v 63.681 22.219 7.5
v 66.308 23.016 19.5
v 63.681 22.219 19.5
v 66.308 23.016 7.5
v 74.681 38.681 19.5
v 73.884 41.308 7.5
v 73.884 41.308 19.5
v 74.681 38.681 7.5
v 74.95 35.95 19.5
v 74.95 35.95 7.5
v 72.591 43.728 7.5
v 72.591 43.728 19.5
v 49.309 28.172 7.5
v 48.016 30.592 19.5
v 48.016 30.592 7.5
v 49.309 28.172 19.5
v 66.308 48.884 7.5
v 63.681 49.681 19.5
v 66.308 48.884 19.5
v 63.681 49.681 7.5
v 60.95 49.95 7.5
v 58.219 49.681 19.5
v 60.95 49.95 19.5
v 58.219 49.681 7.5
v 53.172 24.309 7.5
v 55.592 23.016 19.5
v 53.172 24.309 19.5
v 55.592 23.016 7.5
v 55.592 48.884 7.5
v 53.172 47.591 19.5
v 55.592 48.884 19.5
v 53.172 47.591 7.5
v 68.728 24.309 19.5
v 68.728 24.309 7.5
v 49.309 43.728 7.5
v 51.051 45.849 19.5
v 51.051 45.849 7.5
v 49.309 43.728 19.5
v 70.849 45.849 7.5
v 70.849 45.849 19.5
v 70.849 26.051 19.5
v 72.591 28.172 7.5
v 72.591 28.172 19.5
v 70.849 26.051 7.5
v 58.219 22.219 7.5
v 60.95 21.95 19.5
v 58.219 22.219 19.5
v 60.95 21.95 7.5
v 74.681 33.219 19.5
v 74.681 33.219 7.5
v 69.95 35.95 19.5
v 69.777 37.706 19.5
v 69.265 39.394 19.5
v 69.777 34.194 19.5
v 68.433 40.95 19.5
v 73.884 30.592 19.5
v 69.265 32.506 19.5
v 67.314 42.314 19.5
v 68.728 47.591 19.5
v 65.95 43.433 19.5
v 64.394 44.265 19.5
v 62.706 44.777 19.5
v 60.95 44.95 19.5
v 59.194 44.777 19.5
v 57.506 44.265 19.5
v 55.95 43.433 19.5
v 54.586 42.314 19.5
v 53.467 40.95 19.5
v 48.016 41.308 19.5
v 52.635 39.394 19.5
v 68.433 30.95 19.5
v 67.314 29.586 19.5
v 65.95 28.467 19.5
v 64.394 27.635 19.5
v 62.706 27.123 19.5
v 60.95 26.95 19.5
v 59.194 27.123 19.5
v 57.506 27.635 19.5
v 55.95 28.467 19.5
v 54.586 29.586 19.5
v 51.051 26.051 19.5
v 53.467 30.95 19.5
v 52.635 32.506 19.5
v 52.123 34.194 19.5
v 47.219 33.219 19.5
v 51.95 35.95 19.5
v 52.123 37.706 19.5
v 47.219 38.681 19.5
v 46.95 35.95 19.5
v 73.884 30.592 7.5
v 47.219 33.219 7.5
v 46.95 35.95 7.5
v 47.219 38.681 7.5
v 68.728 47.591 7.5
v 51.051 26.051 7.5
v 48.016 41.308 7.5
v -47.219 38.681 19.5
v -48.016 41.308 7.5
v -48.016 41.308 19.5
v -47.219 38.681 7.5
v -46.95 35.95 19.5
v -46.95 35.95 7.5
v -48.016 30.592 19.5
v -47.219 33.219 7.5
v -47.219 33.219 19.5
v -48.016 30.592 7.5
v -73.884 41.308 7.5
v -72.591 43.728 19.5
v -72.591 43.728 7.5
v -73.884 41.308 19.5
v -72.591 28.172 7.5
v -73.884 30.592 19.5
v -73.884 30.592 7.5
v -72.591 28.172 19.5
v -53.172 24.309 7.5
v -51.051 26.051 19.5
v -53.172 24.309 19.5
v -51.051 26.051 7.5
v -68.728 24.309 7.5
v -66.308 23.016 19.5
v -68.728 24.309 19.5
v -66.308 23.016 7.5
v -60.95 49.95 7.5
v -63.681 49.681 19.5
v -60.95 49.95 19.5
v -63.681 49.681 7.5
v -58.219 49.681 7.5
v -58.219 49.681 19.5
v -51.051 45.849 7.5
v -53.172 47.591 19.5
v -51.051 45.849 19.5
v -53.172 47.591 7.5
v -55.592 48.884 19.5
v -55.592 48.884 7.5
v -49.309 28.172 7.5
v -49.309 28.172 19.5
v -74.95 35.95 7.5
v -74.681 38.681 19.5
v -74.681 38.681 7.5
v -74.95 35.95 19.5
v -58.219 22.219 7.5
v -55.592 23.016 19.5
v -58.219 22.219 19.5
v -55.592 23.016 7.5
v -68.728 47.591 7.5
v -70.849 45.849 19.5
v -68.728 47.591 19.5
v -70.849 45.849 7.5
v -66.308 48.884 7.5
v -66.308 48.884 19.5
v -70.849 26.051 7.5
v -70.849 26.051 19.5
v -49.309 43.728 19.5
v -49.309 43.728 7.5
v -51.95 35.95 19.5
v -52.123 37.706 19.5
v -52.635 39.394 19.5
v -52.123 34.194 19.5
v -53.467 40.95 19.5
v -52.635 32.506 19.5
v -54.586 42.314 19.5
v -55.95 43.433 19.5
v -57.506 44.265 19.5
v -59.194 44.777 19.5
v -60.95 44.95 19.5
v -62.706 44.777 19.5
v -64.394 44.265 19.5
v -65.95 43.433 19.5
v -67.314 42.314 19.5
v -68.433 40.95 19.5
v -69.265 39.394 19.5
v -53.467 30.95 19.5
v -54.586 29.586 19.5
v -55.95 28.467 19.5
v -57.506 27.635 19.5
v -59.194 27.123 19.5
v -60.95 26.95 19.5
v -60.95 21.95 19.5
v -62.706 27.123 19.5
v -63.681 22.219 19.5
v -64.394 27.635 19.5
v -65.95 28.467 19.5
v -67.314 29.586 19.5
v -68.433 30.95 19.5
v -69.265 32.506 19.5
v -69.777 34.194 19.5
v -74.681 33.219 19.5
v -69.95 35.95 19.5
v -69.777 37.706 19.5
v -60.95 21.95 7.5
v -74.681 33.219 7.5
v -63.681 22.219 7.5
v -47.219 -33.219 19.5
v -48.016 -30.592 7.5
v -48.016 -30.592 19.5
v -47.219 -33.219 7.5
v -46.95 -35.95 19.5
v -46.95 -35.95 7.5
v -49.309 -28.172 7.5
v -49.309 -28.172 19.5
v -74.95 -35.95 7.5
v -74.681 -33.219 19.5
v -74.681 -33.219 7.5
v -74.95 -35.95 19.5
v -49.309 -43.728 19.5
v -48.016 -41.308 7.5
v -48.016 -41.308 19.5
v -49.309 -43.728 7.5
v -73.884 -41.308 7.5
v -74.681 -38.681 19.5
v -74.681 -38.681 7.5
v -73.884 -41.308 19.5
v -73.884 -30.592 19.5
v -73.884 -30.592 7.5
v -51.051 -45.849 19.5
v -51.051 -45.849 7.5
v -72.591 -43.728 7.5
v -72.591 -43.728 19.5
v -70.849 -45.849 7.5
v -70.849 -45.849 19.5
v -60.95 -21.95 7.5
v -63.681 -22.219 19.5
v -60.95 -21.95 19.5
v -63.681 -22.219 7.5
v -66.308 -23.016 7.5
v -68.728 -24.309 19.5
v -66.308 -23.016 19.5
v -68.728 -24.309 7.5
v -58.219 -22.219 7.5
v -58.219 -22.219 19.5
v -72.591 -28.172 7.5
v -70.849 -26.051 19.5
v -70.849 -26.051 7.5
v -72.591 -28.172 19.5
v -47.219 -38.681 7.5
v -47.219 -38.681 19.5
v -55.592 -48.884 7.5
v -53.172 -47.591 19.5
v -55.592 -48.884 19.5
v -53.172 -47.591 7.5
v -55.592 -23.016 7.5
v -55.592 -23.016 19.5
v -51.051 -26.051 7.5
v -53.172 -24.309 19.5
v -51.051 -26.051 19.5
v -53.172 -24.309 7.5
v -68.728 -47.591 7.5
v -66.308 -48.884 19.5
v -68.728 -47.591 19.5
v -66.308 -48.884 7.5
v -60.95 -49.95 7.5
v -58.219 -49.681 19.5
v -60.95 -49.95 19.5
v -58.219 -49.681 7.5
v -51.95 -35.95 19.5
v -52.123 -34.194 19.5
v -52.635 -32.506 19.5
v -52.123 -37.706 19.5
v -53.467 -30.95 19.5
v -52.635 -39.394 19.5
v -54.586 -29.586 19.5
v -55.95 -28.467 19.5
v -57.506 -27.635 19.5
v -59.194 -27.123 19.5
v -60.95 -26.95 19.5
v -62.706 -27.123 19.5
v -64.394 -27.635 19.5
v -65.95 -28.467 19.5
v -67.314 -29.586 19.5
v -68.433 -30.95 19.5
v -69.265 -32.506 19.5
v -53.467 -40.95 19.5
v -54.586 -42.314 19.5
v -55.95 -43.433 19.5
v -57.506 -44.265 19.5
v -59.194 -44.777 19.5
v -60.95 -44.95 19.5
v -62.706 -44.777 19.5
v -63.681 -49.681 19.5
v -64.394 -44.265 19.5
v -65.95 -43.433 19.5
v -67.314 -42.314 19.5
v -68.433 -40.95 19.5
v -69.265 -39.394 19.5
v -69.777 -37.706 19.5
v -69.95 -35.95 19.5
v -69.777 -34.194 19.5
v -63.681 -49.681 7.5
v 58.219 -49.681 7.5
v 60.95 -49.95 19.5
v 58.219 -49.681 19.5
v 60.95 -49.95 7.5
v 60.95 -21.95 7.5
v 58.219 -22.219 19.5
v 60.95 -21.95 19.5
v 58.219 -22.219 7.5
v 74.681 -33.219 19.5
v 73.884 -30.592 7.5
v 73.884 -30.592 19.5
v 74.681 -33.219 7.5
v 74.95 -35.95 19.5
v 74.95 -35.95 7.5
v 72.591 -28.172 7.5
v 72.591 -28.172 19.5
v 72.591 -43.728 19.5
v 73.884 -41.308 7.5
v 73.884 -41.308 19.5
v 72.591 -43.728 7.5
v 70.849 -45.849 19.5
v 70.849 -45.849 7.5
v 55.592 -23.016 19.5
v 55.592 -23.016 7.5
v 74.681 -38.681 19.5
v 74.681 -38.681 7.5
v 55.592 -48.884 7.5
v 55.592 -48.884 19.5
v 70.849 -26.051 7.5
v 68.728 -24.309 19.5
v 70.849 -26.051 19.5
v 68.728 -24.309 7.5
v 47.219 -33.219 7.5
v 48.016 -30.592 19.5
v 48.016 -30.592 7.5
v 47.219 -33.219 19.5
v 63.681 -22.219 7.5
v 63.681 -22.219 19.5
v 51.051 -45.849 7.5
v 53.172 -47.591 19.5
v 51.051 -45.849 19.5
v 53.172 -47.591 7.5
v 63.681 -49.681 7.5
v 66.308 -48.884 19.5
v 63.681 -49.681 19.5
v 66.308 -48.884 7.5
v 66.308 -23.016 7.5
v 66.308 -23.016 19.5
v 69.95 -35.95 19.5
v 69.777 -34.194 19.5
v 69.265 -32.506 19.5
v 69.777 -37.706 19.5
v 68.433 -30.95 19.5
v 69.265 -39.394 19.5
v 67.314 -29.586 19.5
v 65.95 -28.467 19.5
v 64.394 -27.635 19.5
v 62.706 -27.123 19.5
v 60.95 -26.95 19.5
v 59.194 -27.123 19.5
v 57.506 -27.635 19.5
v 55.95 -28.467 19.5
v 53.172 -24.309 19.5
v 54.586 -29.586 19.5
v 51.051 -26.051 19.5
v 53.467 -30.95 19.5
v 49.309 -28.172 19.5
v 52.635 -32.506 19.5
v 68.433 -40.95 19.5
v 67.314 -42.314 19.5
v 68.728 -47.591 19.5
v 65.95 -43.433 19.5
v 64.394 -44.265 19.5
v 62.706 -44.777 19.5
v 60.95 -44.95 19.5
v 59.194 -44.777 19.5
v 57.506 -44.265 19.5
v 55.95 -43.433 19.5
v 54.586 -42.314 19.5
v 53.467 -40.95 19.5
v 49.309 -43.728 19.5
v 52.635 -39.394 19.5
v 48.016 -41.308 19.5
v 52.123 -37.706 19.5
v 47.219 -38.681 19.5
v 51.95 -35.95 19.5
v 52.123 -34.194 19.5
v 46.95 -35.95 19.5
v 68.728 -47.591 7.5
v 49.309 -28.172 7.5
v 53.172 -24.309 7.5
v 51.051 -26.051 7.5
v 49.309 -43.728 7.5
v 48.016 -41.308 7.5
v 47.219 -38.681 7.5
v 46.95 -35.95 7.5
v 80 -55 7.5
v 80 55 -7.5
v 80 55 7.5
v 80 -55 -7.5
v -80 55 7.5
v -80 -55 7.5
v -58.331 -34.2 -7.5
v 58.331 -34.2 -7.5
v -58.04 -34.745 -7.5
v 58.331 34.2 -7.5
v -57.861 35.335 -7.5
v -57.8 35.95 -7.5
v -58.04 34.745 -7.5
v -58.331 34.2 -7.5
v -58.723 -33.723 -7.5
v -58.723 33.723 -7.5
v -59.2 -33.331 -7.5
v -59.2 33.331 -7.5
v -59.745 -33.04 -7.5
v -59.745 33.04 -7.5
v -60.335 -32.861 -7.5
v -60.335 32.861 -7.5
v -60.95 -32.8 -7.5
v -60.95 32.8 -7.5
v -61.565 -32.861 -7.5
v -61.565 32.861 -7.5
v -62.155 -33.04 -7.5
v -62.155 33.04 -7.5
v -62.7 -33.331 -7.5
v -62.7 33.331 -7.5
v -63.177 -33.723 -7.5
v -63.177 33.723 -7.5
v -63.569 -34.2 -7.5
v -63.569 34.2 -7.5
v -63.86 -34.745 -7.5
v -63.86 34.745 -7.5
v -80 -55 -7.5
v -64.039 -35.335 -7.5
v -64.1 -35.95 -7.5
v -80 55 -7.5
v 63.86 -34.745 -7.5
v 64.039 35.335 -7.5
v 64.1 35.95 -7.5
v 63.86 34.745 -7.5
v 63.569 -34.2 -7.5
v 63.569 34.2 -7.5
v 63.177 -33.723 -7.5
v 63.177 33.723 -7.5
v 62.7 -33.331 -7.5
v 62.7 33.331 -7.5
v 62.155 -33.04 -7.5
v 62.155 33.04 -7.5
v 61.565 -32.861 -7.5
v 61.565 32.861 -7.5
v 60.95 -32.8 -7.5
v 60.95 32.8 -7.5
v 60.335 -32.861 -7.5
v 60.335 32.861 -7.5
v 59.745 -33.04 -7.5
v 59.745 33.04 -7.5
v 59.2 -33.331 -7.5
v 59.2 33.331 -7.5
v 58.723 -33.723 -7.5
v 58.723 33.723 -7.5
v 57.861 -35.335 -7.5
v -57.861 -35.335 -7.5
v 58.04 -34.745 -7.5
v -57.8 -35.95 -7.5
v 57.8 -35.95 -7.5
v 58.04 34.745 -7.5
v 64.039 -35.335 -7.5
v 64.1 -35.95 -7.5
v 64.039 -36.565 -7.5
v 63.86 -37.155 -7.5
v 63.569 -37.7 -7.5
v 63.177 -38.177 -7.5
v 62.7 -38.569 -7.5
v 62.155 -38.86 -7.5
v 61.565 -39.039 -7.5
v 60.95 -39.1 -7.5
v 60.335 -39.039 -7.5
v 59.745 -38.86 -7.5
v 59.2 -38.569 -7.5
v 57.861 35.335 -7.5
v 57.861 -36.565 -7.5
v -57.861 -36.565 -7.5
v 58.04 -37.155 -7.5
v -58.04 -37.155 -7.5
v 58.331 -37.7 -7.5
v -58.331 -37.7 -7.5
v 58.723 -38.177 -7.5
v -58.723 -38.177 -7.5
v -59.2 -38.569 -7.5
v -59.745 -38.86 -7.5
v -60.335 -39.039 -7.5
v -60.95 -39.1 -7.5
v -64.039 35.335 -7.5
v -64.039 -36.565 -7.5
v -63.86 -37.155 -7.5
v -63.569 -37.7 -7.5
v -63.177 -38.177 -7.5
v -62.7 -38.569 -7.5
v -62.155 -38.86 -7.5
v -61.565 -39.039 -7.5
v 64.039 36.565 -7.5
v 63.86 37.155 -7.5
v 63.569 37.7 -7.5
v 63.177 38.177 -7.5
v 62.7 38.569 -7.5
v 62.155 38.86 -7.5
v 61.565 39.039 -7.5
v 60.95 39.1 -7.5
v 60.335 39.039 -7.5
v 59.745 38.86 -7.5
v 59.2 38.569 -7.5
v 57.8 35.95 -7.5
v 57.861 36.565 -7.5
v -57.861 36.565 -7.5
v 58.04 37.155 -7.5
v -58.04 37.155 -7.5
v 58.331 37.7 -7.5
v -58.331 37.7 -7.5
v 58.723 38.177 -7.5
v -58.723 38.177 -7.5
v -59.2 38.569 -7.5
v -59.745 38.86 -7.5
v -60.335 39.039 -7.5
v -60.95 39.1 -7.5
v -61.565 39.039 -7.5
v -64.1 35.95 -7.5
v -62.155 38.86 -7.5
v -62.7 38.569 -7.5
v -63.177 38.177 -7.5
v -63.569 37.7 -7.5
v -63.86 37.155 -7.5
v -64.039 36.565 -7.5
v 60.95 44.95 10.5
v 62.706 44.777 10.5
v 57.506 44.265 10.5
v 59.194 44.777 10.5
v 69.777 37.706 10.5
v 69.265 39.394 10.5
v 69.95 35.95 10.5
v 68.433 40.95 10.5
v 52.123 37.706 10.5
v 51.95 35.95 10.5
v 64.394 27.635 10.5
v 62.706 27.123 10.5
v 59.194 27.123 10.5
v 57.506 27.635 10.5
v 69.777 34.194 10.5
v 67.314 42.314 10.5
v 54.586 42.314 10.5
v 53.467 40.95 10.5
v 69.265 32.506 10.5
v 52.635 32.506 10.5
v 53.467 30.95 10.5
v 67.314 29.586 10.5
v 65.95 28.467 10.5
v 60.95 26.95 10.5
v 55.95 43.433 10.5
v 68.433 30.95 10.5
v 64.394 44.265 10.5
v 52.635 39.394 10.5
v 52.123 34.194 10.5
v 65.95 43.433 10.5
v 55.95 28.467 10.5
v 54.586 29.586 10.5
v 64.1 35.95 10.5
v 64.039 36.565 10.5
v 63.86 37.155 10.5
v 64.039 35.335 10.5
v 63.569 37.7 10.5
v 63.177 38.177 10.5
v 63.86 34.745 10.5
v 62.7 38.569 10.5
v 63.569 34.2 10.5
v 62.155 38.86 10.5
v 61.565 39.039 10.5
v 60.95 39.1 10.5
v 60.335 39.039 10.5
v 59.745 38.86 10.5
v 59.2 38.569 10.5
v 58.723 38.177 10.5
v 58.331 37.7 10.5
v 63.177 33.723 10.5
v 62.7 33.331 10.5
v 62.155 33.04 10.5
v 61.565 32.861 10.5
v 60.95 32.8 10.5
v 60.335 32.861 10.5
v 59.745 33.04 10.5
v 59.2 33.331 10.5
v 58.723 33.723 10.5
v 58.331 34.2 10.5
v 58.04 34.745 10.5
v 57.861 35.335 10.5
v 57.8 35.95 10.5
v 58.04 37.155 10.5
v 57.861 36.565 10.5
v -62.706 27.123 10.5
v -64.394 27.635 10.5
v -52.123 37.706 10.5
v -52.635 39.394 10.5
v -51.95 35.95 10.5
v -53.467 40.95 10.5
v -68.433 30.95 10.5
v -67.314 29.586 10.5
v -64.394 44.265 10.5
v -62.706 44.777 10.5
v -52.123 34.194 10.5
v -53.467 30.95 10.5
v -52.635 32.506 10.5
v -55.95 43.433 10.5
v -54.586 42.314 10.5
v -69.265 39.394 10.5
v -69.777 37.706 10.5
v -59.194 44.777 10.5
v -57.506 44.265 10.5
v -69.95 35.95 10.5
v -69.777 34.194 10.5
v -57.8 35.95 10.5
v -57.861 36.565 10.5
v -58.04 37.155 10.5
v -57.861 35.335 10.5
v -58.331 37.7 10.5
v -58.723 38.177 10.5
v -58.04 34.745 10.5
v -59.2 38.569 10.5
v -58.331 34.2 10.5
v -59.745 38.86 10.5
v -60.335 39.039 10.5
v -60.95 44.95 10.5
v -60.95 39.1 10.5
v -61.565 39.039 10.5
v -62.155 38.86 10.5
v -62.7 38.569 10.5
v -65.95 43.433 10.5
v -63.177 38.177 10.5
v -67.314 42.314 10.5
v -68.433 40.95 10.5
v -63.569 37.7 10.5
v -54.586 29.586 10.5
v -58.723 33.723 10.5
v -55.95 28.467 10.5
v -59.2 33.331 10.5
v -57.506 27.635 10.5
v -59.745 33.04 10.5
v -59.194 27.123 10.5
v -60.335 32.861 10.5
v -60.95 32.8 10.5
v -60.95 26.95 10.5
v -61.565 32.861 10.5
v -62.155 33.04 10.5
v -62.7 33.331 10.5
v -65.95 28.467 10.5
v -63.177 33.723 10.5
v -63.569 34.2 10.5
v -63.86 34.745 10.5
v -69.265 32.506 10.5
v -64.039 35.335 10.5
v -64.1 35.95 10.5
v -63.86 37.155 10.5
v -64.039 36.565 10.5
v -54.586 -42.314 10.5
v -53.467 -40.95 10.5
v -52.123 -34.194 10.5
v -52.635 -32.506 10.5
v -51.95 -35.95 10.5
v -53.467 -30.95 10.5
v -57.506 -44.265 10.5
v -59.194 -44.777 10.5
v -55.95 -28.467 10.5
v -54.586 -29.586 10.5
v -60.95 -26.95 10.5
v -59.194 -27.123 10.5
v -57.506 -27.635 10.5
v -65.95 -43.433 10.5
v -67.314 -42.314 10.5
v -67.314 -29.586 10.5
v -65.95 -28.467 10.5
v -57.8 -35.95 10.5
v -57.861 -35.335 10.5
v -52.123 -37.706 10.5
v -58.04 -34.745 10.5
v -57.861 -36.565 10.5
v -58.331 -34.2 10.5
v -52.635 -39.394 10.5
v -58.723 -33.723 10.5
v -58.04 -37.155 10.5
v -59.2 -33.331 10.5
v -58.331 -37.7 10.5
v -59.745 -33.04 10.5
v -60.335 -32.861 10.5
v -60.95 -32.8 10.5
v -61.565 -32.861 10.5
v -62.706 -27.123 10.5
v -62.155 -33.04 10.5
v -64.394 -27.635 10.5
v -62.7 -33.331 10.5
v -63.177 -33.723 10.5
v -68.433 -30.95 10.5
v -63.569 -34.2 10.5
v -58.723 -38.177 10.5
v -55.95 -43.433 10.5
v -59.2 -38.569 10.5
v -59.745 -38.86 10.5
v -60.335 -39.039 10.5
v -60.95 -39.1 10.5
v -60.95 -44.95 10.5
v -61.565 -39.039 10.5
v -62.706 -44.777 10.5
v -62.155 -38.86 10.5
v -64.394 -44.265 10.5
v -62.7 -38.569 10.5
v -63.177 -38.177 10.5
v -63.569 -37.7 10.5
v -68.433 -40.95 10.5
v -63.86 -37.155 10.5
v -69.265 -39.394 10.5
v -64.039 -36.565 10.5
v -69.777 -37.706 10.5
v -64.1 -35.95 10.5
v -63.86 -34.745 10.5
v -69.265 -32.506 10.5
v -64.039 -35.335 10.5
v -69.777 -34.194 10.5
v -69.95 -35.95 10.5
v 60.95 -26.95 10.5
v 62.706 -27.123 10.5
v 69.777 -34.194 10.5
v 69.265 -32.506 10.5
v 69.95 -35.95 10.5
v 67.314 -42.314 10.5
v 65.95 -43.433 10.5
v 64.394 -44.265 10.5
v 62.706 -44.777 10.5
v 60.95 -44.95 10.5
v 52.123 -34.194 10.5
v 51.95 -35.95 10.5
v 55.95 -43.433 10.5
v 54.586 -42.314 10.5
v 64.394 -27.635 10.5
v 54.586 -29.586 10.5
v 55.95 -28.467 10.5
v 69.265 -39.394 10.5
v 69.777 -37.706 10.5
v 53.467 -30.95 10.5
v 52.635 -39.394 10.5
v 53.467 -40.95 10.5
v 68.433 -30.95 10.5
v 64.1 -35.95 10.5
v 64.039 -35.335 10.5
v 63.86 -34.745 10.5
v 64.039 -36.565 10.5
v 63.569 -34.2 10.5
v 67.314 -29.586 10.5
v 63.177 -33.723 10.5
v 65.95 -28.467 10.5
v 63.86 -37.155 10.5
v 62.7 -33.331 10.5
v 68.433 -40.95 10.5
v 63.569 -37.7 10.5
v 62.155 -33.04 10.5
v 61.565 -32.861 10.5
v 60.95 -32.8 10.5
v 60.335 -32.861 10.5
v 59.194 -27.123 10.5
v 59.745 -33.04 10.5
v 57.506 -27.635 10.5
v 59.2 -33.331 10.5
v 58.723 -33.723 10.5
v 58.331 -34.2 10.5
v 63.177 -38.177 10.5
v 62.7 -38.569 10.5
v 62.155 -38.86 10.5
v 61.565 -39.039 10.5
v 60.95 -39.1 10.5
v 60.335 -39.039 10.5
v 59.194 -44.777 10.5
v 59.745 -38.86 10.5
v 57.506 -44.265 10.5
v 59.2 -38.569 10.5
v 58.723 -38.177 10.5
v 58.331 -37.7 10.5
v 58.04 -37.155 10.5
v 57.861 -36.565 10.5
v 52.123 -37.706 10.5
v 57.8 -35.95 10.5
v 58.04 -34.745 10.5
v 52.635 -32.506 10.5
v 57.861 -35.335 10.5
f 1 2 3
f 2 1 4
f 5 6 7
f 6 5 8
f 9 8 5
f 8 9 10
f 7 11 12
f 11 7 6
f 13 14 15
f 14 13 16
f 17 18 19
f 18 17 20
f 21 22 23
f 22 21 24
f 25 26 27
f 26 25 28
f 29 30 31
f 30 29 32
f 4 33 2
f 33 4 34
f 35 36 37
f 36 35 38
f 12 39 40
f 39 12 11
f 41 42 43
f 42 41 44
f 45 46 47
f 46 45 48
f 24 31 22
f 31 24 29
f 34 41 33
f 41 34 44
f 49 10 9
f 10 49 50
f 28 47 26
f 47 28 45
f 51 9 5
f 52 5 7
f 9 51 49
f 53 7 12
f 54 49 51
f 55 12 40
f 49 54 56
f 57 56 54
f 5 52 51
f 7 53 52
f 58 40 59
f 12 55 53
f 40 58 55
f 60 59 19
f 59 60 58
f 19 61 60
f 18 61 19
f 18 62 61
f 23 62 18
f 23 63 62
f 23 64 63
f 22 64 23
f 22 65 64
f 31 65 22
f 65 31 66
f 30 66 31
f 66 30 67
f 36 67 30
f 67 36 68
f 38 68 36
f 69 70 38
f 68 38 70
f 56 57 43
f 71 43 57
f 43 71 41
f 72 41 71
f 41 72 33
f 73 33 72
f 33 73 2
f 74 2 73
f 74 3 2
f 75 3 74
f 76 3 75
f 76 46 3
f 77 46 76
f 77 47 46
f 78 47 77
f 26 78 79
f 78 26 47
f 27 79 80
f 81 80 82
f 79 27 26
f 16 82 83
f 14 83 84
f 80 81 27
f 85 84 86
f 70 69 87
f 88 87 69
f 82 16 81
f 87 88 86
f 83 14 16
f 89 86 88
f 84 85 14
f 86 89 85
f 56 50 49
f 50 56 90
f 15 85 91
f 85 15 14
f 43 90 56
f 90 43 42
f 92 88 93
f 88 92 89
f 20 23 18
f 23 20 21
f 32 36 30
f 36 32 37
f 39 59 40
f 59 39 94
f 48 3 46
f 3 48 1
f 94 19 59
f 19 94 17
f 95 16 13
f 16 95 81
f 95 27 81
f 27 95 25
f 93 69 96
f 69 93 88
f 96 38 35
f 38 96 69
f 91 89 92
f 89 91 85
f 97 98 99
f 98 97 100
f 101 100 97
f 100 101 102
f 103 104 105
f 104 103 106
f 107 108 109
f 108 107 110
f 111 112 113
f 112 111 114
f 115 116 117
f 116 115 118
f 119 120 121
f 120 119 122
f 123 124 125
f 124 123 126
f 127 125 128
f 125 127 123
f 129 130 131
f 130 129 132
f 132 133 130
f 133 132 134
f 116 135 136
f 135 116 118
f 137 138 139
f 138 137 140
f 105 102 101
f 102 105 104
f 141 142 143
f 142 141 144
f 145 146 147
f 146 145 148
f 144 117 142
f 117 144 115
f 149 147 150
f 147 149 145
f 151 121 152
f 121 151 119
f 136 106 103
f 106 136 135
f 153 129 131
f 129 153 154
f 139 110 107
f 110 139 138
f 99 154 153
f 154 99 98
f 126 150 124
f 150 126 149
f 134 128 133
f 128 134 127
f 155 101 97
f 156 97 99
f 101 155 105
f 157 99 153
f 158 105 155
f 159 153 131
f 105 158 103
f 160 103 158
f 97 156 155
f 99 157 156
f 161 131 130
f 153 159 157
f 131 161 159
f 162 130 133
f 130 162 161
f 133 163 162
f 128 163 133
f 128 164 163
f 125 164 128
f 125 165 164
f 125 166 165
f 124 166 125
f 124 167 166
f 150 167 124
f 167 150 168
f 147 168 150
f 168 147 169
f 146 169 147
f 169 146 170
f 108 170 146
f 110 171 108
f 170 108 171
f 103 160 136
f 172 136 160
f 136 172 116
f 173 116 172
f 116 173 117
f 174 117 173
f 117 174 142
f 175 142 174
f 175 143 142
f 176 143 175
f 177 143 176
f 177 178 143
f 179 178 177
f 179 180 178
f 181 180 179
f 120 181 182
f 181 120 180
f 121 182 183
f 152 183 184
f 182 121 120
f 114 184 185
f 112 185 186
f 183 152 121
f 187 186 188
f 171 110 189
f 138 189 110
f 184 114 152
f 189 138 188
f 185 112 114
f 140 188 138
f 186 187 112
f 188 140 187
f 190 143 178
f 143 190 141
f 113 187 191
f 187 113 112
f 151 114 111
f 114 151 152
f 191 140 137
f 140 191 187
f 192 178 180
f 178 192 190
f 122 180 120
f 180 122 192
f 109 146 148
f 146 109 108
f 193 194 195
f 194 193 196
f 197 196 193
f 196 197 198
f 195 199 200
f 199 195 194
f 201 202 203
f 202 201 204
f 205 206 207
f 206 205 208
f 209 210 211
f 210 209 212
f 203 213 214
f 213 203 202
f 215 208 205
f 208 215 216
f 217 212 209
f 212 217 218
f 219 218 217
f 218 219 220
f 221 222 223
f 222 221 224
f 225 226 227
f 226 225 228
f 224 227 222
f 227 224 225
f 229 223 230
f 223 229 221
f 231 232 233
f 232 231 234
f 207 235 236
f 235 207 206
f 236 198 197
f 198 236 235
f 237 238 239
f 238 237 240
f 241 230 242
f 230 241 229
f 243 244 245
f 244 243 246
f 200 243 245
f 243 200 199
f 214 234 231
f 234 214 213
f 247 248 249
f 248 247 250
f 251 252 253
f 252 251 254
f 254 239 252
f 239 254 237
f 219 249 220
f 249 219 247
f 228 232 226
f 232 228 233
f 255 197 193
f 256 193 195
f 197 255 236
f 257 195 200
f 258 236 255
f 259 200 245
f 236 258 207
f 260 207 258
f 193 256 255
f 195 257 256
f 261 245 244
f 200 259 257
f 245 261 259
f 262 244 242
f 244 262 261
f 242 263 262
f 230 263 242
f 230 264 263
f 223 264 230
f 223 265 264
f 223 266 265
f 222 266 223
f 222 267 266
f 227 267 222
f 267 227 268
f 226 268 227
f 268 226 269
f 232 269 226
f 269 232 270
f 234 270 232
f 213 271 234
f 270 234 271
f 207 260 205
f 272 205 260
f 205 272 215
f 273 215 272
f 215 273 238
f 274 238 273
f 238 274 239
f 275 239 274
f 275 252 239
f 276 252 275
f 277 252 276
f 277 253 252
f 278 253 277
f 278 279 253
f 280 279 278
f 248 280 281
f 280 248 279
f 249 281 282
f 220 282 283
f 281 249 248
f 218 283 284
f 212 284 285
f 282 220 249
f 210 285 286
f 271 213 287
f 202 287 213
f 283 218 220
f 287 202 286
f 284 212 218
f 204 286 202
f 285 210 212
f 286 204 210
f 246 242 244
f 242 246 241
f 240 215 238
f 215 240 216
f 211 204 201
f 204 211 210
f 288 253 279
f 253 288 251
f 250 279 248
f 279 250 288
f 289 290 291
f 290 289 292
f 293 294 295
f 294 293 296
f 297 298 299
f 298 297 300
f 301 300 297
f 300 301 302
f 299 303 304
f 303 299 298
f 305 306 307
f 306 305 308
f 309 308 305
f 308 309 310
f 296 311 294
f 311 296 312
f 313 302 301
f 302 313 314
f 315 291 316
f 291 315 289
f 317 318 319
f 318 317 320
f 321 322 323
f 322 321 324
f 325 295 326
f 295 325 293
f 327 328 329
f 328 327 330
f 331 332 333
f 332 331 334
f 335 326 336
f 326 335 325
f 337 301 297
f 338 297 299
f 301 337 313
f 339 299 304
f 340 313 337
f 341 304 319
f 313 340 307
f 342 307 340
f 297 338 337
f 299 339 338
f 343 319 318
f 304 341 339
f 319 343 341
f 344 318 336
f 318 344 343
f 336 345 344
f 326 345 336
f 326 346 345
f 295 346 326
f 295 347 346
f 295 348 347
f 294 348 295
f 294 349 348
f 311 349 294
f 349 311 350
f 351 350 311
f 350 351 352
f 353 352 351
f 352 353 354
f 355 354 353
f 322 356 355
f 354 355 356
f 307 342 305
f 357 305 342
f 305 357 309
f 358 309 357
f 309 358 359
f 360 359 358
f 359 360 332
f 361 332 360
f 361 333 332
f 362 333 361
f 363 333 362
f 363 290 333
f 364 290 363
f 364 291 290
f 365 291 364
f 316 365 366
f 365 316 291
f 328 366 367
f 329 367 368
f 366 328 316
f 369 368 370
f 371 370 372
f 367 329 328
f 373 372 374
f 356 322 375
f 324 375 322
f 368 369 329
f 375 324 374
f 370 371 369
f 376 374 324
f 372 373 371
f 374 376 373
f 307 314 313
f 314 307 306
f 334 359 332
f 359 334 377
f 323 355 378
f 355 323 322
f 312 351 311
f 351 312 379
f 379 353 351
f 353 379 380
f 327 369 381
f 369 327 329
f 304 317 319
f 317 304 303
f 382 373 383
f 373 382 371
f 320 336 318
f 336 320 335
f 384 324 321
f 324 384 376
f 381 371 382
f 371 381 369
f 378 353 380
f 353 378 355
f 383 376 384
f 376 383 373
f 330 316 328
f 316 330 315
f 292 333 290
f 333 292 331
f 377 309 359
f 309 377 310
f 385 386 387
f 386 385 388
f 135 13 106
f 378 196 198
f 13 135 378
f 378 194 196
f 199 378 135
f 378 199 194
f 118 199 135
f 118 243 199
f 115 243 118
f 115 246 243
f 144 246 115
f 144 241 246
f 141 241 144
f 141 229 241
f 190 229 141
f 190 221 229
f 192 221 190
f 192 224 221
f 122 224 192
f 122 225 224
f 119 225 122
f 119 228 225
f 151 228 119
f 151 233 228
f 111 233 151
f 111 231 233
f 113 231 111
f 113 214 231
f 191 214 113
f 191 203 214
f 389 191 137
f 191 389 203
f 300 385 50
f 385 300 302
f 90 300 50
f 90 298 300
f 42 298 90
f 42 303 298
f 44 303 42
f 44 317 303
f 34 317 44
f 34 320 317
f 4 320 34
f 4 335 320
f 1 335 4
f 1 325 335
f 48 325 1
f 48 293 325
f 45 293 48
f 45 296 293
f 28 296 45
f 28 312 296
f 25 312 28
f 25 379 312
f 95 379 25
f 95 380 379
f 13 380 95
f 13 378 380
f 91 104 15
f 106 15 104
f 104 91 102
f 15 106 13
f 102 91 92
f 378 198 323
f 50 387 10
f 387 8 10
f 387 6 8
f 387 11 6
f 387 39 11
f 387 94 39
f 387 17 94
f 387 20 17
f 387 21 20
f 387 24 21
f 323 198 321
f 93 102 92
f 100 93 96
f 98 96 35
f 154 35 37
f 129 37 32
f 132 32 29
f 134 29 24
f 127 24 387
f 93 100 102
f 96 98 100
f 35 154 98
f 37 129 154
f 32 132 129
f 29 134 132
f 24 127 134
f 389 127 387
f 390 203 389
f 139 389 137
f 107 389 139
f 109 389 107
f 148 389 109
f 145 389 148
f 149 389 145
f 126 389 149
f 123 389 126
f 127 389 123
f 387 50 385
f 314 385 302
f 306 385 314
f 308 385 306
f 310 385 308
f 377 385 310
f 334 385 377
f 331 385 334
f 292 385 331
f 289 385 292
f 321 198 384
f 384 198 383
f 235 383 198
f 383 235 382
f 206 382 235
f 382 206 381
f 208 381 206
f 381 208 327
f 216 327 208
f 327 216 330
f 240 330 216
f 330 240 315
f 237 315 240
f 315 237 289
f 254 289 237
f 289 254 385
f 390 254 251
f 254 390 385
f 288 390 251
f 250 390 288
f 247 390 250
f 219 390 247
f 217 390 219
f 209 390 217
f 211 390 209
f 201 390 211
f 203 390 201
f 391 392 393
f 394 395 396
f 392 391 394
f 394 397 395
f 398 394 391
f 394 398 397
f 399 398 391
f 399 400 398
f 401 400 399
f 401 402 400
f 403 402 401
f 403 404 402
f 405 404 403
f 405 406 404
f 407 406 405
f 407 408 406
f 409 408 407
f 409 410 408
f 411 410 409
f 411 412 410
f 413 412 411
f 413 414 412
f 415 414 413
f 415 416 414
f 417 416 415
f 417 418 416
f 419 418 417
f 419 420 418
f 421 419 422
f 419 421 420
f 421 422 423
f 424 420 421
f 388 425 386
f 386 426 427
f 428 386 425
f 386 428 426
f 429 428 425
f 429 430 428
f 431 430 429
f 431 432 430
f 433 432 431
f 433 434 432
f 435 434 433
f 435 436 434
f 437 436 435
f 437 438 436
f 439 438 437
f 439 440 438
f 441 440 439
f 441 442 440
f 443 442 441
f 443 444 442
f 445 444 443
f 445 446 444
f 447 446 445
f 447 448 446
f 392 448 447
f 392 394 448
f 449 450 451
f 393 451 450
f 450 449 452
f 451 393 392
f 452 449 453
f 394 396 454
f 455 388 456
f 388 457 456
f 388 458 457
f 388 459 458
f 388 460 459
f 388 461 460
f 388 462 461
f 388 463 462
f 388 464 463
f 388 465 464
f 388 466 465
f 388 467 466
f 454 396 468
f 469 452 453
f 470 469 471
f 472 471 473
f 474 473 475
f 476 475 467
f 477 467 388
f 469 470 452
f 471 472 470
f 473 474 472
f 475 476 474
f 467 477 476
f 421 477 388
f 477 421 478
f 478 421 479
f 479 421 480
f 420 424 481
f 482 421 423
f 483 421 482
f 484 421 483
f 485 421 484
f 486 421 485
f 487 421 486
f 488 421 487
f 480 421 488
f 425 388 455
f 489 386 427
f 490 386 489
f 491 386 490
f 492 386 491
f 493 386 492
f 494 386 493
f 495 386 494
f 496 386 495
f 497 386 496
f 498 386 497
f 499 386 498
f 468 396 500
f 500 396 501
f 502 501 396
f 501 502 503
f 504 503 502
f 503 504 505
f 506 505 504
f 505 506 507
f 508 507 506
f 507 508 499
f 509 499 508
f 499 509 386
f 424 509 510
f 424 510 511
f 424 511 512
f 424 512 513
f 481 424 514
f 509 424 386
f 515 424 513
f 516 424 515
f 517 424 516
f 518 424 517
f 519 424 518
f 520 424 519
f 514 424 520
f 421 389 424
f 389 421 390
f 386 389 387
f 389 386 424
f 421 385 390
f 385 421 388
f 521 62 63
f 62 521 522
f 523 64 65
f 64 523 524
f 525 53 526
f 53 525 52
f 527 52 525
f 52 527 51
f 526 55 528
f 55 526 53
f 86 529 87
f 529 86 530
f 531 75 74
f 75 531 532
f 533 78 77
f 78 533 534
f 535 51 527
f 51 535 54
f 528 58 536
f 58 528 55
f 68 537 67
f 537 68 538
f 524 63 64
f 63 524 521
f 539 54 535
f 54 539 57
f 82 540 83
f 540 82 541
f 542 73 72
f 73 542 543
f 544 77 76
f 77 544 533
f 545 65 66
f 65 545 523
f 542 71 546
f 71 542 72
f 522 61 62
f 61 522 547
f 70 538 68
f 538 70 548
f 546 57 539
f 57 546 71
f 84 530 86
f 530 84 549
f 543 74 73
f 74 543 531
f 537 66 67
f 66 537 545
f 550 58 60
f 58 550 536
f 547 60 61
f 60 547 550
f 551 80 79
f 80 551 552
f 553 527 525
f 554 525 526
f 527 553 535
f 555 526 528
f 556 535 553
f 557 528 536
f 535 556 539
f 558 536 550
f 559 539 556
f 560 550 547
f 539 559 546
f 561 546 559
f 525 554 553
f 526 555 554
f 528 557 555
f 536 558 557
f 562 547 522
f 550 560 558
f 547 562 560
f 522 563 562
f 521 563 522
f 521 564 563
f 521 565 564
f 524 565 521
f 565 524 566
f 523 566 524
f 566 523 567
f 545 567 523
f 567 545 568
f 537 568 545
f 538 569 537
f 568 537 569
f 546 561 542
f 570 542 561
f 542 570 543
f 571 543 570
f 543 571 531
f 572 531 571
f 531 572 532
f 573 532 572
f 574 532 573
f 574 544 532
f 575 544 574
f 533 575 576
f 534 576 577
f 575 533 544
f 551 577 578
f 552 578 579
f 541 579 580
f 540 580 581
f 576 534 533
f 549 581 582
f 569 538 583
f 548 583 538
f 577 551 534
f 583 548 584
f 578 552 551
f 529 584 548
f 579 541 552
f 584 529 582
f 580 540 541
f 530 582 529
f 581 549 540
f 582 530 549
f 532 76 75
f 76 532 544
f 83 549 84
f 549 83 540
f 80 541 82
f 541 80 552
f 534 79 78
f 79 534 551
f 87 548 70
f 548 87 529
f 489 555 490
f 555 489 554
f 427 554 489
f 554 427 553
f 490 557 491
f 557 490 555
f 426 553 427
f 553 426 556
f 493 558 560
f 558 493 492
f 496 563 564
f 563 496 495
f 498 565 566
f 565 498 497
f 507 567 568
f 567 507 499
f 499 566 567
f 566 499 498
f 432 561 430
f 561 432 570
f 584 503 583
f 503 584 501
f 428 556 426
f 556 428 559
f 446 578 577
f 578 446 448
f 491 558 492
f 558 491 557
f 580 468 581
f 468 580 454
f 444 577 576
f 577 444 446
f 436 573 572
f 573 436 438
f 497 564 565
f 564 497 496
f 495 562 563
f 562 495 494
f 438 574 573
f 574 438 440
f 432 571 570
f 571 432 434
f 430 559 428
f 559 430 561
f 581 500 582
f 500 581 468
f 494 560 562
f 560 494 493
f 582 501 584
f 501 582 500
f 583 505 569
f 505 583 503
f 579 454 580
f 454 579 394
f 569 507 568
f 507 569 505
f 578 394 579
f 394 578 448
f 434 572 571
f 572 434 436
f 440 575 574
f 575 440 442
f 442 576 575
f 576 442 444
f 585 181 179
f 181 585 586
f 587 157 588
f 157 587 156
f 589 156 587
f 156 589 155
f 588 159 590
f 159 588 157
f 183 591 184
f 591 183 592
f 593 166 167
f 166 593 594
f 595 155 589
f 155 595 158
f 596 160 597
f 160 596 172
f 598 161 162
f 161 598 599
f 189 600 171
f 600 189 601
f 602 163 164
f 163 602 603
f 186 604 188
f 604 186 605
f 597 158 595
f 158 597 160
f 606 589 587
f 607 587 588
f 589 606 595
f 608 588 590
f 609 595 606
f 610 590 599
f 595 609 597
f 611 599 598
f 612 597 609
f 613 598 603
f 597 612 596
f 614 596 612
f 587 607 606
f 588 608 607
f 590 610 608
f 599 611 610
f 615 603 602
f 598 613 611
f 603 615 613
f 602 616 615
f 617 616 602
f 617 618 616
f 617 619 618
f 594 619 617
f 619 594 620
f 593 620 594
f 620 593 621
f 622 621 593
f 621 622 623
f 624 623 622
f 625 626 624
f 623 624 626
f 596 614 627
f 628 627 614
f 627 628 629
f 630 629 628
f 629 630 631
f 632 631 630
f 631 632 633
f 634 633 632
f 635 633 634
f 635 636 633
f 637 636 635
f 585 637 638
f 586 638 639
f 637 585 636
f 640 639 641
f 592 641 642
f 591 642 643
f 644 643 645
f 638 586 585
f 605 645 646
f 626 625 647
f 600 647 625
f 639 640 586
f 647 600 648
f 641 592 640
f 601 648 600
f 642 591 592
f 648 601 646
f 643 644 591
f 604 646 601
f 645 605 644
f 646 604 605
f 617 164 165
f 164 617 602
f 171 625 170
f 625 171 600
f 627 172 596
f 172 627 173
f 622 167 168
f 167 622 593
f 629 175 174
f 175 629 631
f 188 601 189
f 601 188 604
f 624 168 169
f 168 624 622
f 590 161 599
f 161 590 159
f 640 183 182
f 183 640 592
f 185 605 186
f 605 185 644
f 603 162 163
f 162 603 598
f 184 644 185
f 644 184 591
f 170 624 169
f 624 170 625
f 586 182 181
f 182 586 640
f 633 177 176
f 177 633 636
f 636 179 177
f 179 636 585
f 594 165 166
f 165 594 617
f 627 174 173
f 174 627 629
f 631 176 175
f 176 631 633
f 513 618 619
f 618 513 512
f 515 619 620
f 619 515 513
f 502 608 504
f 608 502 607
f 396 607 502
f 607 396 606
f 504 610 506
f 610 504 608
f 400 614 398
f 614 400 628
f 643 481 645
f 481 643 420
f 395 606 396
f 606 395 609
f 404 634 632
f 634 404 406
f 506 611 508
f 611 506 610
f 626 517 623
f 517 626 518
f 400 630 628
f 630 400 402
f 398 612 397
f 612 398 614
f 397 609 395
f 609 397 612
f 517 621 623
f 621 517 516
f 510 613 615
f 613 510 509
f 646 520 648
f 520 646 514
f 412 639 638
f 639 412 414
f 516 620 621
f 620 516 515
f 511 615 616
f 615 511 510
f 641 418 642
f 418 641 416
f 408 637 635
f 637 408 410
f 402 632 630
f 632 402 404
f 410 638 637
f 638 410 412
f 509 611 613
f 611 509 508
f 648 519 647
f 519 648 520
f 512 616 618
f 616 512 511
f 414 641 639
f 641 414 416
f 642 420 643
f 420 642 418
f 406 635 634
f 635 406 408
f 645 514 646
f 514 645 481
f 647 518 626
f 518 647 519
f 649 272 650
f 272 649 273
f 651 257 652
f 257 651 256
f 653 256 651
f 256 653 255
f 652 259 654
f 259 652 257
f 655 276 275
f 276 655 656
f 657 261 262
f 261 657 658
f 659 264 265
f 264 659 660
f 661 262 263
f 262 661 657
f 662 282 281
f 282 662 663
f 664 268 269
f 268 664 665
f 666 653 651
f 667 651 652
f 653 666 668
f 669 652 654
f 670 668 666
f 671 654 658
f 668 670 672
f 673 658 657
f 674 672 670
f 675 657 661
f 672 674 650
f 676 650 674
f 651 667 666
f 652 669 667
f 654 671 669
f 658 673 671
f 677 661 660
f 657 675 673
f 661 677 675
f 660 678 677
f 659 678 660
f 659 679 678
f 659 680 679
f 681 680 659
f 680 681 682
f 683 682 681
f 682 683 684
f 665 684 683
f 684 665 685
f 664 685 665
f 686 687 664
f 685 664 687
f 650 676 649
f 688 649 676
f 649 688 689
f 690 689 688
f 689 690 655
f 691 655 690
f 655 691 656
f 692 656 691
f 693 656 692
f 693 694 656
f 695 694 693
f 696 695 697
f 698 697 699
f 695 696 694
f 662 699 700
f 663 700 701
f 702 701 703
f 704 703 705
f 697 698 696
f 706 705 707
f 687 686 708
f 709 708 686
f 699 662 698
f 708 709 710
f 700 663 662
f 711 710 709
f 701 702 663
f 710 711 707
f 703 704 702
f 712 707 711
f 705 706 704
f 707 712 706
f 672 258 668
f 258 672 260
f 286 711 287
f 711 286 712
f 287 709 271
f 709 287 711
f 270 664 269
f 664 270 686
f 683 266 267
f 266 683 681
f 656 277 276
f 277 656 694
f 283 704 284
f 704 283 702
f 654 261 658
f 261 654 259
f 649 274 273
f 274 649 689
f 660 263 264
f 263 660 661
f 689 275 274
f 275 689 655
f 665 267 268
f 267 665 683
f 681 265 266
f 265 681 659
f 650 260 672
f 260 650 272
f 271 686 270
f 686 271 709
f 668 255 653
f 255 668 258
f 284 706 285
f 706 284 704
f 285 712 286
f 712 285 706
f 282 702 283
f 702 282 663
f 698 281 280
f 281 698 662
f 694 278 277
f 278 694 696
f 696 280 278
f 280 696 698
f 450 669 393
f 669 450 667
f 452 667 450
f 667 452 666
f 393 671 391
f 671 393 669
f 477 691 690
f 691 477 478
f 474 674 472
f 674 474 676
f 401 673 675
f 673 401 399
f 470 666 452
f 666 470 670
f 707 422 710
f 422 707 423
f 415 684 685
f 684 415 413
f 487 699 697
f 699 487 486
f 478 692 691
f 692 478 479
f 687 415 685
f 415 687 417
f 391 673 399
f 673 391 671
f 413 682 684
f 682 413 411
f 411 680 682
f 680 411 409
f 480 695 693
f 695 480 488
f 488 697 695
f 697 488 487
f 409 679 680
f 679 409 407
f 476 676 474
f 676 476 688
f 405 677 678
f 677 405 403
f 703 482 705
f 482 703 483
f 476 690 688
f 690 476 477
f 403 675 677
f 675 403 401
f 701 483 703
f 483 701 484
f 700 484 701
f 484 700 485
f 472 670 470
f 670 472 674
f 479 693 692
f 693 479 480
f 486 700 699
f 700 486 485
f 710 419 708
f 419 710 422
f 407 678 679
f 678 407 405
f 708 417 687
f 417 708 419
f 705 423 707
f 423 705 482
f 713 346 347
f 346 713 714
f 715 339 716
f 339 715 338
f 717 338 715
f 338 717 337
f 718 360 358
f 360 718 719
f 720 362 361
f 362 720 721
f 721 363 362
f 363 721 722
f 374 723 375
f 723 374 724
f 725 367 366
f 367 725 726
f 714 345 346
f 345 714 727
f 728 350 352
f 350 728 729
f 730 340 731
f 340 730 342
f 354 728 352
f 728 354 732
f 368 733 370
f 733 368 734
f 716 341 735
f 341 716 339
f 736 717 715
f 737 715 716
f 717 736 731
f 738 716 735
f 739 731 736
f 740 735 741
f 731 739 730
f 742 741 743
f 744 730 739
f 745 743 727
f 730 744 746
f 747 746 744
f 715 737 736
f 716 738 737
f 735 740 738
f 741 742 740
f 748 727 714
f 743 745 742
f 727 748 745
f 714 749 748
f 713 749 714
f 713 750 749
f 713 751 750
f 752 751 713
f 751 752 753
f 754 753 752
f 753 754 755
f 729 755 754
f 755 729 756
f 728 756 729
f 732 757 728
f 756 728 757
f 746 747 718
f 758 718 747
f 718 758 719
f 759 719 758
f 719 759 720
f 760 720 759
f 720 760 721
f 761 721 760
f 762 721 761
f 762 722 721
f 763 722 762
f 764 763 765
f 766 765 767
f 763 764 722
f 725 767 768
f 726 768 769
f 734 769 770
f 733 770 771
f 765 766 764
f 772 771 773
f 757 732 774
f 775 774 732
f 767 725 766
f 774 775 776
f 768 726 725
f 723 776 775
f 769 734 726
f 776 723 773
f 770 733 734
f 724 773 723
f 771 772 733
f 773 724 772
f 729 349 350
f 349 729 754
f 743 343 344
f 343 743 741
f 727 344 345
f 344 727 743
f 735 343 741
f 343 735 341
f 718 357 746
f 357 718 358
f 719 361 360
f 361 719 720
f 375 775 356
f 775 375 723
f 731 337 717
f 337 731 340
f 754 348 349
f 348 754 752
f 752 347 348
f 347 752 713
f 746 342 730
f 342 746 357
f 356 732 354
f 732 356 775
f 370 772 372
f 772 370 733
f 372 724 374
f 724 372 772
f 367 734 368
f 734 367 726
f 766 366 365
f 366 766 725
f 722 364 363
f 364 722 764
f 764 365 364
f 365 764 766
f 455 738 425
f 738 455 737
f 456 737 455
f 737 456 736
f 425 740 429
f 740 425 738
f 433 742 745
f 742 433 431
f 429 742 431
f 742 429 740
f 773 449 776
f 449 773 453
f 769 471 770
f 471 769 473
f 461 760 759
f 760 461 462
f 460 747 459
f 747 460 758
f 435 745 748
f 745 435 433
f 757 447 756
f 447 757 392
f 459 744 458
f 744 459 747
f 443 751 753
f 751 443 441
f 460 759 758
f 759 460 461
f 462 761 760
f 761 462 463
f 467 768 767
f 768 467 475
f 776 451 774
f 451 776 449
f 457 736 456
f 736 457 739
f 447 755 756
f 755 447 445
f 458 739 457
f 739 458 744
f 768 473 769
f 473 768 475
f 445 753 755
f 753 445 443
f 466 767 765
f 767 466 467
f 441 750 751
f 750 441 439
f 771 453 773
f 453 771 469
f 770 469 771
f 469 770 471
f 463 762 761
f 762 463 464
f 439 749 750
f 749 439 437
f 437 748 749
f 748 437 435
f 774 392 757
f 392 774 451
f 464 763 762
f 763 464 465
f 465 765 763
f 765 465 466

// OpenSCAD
$fn = 32;

// ----------------------------------------------------------------------
// Socket pad plate
// bosses with counterbored sockets for the screws
// ----------------------------------------------------------------------

// --- parameters (mm) ---
base_t = 15;             // base plate thickness
boss_h = 12;             // boss height above the base plate
boss_d = 28;             // boss diameter
socket_d = 18;           // socket diameter
socket_depth = 9;        // socket depth from the boss face
bolt_d = 6.3;            // screw clearance hole through the socket floor
plate = [160, 110, 15];  // overall size (x, y, z)
edge = 19.05;            // boss centre offset from the plate edge
pads = 4;                // boss count, one per corner

// --- derived feature positions (mm) ---
height = base_t + boss_h;        // = 27   overall height of the part
corner_x = plate[0] / 2 - edge;  // = 60.95   boss centre X
corner_y = plate[1] / 2 - edge;  // = 35.95   boss centre Y
feature_centers = [
  [corner_x, corner_y],
  [-corner_x, corner_y],
  [-corner_x, -corner_y],
  [corner_x, -corner_y]
];   // boss centres: sockets, holes and the pads themselves are placed from here

// base plate, bosses on feature_centers, socket + through hole in each
difference() {
  union() {
    cube(plate, center = true);
    for (centre = feature_centers)
      translate([centre[0], centre[1], plate[2] / 2 - 1])
        cylinder(d = boss_d, h = boss_h + 1);
  }
  for (centre = feature_centers) {
    translate([centre[0], centre[1], plate[2] / 2 + boss_h - socket_depth])
      cylinder(d = socket_d, h = socket_depth + 1);
    translate([centre[0], centre[1], -height])
      cylinder(d = bolt_d, h = 2 * height + 2);  // through the socket floor
  }
}
